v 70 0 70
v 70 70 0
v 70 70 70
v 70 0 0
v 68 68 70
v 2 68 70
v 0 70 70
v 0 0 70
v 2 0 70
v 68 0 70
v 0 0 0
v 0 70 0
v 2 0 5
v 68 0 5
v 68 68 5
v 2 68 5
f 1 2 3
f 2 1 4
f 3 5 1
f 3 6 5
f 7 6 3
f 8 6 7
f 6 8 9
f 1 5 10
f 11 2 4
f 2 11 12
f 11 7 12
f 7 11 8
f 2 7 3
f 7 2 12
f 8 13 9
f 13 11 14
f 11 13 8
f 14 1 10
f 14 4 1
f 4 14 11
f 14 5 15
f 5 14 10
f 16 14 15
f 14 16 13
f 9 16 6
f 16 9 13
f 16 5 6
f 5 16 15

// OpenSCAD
$fn=72;

size=70;
thickness=2;
inner=size-thickness*2;

module photo() {
    rotate([90, 0, 0])
        translate([size/2, size/2 , -thickness])
            scale([0.33, 0.33, 0.02])
                surface("image.png", true, false, 0);   
}

module hollow_cube() {
    difference() {
        cube(size);
        translate([thickness, -1, thickness*2+1])
            cube([inner, inner+thickness+1, inner]);
    }
}

module lamp() {
    photo();
    hollow_cube();
}

intersection() {
    lamp();
    cube(size);
}
